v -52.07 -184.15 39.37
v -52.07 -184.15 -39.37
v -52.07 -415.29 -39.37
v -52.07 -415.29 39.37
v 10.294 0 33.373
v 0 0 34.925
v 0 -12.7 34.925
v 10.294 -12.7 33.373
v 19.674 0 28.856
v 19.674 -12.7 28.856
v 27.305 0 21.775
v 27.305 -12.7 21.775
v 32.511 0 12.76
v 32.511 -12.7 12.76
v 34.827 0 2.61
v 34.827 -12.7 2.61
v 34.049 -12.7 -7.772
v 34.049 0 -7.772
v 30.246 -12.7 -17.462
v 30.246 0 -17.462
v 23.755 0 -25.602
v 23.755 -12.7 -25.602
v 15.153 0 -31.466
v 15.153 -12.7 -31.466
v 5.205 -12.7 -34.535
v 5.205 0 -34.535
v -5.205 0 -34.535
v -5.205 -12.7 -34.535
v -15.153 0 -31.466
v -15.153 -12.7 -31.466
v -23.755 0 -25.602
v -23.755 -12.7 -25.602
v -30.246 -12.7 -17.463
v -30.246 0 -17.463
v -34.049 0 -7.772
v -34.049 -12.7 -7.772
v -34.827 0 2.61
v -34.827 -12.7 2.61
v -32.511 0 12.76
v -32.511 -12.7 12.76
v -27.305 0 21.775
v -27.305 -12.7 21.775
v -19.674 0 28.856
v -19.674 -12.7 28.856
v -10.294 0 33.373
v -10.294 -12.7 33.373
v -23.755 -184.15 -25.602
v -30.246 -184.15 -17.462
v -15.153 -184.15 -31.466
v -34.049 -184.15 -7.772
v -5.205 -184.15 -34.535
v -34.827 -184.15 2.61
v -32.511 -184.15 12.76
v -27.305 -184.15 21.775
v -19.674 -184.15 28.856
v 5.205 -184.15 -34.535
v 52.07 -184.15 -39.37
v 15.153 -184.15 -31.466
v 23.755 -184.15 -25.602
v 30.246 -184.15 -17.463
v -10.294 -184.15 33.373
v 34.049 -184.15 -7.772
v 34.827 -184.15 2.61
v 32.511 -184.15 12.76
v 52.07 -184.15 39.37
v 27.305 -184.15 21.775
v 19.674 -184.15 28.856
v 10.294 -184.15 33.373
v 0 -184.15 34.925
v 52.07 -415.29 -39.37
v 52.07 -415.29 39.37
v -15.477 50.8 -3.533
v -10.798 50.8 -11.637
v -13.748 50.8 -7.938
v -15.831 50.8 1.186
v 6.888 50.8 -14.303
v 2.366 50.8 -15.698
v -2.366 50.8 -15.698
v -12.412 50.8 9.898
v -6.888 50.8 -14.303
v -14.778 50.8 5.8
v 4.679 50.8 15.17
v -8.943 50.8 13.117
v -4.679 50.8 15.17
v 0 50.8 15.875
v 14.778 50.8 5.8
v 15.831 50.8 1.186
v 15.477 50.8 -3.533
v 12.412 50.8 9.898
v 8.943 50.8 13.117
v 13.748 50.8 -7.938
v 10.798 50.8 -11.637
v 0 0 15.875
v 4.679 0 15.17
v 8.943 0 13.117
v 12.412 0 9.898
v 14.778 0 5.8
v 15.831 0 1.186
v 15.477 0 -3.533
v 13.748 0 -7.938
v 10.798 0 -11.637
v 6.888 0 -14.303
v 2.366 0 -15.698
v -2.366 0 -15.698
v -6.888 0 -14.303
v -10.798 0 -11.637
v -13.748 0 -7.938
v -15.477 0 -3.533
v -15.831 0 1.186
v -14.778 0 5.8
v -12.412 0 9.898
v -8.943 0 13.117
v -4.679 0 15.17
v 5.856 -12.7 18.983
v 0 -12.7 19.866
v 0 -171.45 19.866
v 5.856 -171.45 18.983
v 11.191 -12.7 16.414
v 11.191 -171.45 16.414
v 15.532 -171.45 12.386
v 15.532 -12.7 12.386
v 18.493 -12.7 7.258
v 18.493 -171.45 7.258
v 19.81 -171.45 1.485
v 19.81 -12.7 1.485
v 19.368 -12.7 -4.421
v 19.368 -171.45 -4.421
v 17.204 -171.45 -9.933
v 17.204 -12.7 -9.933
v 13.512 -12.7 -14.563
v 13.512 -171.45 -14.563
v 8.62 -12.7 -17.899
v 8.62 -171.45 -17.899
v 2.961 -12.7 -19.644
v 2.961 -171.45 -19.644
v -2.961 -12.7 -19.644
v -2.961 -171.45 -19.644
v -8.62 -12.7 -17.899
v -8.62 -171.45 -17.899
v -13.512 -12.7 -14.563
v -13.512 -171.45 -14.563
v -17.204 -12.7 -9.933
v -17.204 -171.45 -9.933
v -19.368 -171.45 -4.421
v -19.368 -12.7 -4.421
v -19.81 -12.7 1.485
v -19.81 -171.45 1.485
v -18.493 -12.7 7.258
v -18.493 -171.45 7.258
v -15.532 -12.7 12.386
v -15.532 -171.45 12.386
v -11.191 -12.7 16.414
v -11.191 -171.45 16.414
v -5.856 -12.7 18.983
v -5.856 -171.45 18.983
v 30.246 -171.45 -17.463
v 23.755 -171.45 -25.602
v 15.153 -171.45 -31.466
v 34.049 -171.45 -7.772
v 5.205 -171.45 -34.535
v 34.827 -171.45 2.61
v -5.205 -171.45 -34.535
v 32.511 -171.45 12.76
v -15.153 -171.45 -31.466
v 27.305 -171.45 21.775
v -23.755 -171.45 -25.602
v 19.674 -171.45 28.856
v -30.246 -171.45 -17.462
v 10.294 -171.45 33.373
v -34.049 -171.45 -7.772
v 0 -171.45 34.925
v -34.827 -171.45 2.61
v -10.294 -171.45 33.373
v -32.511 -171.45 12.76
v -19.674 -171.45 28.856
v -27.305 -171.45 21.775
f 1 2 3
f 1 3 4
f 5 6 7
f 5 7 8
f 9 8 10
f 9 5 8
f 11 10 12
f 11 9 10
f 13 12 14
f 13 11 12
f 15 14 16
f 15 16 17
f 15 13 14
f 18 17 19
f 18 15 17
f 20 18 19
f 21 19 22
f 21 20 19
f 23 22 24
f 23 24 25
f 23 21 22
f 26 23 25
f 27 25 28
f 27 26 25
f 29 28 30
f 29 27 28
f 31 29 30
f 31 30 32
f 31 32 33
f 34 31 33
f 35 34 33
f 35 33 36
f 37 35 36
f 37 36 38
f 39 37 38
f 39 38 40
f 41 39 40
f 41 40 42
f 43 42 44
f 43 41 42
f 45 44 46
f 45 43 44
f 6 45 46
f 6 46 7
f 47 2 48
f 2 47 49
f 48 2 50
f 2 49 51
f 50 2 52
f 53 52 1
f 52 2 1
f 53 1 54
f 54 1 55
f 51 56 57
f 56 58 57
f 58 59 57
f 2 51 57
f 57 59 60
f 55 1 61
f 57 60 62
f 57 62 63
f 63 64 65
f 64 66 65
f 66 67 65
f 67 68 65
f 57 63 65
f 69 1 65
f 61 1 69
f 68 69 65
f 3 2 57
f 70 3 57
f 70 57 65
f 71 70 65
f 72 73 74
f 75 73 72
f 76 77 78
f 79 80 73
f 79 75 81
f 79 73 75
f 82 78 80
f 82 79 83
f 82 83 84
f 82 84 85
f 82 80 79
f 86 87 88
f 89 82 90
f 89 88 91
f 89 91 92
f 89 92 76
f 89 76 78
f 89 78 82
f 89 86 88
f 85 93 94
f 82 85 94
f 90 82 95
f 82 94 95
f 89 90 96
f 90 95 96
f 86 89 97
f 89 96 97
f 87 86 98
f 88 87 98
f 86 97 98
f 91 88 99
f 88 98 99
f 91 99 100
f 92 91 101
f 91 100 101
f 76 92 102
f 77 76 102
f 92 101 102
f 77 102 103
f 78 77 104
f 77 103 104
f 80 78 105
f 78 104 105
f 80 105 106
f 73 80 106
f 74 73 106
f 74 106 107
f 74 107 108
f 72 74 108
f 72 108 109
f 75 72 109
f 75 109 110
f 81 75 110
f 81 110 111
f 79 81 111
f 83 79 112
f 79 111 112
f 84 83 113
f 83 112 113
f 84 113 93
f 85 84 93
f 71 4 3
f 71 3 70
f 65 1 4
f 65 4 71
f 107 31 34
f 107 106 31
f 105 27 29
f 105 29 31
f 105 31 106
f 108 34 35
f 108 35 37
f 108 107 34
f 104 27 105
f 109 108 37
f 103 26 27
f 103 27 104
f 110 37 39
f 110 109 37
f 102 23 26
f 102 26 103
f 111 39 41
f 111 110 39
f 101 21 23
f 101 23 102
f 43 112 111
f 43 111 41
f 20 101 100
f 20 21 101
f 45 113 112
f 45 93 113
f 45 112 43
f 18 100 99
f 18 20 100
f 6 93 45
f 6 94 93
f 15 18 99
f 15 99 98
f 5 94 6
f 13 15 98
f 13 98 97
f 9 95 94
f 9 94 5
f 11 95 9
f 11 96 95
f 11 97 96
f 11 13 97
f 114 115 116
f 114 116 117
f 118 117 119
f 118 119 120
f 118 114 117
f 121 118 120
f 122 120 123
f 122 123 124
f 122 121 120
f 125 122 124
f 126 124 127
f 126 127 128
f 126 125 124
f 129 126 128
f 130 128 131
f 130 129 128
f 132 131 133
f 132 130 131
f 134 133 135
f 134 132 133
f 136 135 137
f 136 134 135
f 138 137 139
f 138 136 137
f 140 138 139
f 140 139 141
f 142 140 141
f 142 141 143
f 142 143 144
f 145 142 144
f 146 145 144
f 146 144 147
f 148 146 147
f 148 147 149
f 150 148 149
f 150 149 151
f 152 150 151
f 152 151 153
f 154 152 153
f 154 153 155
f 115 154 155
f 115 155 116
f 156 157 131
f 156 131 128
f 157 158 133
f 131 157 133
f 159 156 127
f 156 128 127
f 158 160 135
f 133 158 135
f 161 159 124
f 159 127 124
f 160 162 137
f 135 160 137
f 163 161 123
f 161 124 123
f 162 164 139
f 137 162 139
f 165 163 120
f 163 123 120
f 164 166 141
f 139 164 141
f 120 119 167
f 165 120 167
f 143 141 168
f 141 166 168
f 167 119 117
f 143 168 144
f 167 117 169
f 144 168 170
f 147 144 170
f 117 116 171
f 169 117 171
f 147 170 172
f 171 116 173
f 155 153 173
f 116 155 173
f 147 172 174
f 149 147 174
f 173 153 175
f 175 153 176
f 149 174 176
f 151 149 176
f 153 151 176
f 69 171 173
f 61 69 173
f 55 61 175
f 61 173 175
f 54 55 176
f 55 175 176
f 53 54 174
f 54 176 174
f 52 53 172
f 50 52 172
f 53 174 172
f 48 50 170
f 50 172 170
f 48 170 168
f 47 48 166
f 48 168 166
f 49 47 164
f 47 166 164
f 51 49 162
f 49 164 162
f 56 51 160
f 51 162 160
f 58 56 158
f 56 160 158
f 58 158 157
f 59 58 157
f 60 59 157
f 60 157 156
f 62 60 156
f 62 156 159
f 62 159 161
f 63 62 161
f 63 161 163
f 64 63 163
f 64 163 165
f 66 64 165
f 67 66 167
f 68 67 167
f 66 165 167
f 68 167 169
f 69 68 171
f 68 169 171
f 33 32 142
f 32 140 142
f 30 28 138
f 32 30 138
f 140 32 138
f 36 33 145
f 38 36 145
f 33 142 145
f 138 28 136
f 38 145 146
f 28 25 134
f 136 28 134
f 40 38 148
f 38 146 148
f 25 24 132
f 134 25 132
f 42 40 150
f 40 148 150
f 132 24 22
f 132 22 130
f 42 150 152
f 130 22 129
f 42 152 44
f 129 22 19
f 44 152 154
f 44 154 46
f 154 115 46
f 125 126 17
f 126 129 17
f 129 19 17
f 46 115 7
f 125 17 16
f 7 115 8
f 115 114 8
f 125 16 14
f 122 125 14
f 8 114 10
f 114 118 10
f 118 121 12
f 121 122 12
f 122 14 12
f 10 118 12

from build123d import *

# Parameters (mm, degrees)
SKETCH1_R      = 34.925
EXTRUDE1_DEPTH = 12.7
SKETCH2_R      = 19.86600399
EXTRUDE2_DEPTH = 184.15
SKETCH3_R      = 15.875
EXTRUDE3_DEPTH = 50.8
EXTRUDE4_START = -12.7
SKETCH4_R      = 34.925
EXTRUDE4_DEPTH = 12.7
SKETCH5_W      = 104.14
SKETCH5_H      = 78.74
EXTRUDE5_DEPTH = 231.14


with BuildPart() as part:
    # Sketch1 → Extrude1 (new body)
    with BuildSketch(Plane(origin=(0, 0, 0), x_dir=(1, 0, 0), z_dir=(0, 1, 0))):
        with Locations(Location((0, 0, 0), (0, 0, 270))):
            Circle(SKETCH1_R)
    extrude(amount=-EXTRUDE1_DEPTH)

    # Sketch2 → Extrude2 (add)
    with BuildSketch(Plane(origin=(0, 0, 0), x_dir=(1, 0, 0), z_dir=(0, 1, 0))):
        with Locations(Location((0, 0, 0), (0, 0, 270))):
            Circle(SKETCH2_R)
    extrude(amount=-EXTRUDE2_DEPTH)

    # Sketch3 → Extrude3 (add)
    with BuildSketch(Plane(origin=(0, 0, 0), x_dir=(1, 0, 0), z_dir=(0, 1, 0))):
        with Locations(Location((0, 0, 0), (0, 0, 270))):
            Circle(SKETCH3_R)
    extrude(amount=EXTRUDE3_DEPTH)

    # Sketch4 → Extrude4 (add)
    with BuildSketch(Plane.XZ.offset(184.15).offset(EXTRUDE4_START)):
        with Locations(Location((0, 0, 0), (0, 0, 90))):
            Circle(SKETCH4_R)
    extrude(amount=EXTRUDE4_DEPTH)

    # Sketch5 → Extrude5 (add)
    with BuildSketch(Plane.XZ.offset(184.15)):
        Rectangle(SKETCH5_W, SKETCH5_H)
    extrude(amount=EXTRUDE5_DEPTH)


solid = part.part
